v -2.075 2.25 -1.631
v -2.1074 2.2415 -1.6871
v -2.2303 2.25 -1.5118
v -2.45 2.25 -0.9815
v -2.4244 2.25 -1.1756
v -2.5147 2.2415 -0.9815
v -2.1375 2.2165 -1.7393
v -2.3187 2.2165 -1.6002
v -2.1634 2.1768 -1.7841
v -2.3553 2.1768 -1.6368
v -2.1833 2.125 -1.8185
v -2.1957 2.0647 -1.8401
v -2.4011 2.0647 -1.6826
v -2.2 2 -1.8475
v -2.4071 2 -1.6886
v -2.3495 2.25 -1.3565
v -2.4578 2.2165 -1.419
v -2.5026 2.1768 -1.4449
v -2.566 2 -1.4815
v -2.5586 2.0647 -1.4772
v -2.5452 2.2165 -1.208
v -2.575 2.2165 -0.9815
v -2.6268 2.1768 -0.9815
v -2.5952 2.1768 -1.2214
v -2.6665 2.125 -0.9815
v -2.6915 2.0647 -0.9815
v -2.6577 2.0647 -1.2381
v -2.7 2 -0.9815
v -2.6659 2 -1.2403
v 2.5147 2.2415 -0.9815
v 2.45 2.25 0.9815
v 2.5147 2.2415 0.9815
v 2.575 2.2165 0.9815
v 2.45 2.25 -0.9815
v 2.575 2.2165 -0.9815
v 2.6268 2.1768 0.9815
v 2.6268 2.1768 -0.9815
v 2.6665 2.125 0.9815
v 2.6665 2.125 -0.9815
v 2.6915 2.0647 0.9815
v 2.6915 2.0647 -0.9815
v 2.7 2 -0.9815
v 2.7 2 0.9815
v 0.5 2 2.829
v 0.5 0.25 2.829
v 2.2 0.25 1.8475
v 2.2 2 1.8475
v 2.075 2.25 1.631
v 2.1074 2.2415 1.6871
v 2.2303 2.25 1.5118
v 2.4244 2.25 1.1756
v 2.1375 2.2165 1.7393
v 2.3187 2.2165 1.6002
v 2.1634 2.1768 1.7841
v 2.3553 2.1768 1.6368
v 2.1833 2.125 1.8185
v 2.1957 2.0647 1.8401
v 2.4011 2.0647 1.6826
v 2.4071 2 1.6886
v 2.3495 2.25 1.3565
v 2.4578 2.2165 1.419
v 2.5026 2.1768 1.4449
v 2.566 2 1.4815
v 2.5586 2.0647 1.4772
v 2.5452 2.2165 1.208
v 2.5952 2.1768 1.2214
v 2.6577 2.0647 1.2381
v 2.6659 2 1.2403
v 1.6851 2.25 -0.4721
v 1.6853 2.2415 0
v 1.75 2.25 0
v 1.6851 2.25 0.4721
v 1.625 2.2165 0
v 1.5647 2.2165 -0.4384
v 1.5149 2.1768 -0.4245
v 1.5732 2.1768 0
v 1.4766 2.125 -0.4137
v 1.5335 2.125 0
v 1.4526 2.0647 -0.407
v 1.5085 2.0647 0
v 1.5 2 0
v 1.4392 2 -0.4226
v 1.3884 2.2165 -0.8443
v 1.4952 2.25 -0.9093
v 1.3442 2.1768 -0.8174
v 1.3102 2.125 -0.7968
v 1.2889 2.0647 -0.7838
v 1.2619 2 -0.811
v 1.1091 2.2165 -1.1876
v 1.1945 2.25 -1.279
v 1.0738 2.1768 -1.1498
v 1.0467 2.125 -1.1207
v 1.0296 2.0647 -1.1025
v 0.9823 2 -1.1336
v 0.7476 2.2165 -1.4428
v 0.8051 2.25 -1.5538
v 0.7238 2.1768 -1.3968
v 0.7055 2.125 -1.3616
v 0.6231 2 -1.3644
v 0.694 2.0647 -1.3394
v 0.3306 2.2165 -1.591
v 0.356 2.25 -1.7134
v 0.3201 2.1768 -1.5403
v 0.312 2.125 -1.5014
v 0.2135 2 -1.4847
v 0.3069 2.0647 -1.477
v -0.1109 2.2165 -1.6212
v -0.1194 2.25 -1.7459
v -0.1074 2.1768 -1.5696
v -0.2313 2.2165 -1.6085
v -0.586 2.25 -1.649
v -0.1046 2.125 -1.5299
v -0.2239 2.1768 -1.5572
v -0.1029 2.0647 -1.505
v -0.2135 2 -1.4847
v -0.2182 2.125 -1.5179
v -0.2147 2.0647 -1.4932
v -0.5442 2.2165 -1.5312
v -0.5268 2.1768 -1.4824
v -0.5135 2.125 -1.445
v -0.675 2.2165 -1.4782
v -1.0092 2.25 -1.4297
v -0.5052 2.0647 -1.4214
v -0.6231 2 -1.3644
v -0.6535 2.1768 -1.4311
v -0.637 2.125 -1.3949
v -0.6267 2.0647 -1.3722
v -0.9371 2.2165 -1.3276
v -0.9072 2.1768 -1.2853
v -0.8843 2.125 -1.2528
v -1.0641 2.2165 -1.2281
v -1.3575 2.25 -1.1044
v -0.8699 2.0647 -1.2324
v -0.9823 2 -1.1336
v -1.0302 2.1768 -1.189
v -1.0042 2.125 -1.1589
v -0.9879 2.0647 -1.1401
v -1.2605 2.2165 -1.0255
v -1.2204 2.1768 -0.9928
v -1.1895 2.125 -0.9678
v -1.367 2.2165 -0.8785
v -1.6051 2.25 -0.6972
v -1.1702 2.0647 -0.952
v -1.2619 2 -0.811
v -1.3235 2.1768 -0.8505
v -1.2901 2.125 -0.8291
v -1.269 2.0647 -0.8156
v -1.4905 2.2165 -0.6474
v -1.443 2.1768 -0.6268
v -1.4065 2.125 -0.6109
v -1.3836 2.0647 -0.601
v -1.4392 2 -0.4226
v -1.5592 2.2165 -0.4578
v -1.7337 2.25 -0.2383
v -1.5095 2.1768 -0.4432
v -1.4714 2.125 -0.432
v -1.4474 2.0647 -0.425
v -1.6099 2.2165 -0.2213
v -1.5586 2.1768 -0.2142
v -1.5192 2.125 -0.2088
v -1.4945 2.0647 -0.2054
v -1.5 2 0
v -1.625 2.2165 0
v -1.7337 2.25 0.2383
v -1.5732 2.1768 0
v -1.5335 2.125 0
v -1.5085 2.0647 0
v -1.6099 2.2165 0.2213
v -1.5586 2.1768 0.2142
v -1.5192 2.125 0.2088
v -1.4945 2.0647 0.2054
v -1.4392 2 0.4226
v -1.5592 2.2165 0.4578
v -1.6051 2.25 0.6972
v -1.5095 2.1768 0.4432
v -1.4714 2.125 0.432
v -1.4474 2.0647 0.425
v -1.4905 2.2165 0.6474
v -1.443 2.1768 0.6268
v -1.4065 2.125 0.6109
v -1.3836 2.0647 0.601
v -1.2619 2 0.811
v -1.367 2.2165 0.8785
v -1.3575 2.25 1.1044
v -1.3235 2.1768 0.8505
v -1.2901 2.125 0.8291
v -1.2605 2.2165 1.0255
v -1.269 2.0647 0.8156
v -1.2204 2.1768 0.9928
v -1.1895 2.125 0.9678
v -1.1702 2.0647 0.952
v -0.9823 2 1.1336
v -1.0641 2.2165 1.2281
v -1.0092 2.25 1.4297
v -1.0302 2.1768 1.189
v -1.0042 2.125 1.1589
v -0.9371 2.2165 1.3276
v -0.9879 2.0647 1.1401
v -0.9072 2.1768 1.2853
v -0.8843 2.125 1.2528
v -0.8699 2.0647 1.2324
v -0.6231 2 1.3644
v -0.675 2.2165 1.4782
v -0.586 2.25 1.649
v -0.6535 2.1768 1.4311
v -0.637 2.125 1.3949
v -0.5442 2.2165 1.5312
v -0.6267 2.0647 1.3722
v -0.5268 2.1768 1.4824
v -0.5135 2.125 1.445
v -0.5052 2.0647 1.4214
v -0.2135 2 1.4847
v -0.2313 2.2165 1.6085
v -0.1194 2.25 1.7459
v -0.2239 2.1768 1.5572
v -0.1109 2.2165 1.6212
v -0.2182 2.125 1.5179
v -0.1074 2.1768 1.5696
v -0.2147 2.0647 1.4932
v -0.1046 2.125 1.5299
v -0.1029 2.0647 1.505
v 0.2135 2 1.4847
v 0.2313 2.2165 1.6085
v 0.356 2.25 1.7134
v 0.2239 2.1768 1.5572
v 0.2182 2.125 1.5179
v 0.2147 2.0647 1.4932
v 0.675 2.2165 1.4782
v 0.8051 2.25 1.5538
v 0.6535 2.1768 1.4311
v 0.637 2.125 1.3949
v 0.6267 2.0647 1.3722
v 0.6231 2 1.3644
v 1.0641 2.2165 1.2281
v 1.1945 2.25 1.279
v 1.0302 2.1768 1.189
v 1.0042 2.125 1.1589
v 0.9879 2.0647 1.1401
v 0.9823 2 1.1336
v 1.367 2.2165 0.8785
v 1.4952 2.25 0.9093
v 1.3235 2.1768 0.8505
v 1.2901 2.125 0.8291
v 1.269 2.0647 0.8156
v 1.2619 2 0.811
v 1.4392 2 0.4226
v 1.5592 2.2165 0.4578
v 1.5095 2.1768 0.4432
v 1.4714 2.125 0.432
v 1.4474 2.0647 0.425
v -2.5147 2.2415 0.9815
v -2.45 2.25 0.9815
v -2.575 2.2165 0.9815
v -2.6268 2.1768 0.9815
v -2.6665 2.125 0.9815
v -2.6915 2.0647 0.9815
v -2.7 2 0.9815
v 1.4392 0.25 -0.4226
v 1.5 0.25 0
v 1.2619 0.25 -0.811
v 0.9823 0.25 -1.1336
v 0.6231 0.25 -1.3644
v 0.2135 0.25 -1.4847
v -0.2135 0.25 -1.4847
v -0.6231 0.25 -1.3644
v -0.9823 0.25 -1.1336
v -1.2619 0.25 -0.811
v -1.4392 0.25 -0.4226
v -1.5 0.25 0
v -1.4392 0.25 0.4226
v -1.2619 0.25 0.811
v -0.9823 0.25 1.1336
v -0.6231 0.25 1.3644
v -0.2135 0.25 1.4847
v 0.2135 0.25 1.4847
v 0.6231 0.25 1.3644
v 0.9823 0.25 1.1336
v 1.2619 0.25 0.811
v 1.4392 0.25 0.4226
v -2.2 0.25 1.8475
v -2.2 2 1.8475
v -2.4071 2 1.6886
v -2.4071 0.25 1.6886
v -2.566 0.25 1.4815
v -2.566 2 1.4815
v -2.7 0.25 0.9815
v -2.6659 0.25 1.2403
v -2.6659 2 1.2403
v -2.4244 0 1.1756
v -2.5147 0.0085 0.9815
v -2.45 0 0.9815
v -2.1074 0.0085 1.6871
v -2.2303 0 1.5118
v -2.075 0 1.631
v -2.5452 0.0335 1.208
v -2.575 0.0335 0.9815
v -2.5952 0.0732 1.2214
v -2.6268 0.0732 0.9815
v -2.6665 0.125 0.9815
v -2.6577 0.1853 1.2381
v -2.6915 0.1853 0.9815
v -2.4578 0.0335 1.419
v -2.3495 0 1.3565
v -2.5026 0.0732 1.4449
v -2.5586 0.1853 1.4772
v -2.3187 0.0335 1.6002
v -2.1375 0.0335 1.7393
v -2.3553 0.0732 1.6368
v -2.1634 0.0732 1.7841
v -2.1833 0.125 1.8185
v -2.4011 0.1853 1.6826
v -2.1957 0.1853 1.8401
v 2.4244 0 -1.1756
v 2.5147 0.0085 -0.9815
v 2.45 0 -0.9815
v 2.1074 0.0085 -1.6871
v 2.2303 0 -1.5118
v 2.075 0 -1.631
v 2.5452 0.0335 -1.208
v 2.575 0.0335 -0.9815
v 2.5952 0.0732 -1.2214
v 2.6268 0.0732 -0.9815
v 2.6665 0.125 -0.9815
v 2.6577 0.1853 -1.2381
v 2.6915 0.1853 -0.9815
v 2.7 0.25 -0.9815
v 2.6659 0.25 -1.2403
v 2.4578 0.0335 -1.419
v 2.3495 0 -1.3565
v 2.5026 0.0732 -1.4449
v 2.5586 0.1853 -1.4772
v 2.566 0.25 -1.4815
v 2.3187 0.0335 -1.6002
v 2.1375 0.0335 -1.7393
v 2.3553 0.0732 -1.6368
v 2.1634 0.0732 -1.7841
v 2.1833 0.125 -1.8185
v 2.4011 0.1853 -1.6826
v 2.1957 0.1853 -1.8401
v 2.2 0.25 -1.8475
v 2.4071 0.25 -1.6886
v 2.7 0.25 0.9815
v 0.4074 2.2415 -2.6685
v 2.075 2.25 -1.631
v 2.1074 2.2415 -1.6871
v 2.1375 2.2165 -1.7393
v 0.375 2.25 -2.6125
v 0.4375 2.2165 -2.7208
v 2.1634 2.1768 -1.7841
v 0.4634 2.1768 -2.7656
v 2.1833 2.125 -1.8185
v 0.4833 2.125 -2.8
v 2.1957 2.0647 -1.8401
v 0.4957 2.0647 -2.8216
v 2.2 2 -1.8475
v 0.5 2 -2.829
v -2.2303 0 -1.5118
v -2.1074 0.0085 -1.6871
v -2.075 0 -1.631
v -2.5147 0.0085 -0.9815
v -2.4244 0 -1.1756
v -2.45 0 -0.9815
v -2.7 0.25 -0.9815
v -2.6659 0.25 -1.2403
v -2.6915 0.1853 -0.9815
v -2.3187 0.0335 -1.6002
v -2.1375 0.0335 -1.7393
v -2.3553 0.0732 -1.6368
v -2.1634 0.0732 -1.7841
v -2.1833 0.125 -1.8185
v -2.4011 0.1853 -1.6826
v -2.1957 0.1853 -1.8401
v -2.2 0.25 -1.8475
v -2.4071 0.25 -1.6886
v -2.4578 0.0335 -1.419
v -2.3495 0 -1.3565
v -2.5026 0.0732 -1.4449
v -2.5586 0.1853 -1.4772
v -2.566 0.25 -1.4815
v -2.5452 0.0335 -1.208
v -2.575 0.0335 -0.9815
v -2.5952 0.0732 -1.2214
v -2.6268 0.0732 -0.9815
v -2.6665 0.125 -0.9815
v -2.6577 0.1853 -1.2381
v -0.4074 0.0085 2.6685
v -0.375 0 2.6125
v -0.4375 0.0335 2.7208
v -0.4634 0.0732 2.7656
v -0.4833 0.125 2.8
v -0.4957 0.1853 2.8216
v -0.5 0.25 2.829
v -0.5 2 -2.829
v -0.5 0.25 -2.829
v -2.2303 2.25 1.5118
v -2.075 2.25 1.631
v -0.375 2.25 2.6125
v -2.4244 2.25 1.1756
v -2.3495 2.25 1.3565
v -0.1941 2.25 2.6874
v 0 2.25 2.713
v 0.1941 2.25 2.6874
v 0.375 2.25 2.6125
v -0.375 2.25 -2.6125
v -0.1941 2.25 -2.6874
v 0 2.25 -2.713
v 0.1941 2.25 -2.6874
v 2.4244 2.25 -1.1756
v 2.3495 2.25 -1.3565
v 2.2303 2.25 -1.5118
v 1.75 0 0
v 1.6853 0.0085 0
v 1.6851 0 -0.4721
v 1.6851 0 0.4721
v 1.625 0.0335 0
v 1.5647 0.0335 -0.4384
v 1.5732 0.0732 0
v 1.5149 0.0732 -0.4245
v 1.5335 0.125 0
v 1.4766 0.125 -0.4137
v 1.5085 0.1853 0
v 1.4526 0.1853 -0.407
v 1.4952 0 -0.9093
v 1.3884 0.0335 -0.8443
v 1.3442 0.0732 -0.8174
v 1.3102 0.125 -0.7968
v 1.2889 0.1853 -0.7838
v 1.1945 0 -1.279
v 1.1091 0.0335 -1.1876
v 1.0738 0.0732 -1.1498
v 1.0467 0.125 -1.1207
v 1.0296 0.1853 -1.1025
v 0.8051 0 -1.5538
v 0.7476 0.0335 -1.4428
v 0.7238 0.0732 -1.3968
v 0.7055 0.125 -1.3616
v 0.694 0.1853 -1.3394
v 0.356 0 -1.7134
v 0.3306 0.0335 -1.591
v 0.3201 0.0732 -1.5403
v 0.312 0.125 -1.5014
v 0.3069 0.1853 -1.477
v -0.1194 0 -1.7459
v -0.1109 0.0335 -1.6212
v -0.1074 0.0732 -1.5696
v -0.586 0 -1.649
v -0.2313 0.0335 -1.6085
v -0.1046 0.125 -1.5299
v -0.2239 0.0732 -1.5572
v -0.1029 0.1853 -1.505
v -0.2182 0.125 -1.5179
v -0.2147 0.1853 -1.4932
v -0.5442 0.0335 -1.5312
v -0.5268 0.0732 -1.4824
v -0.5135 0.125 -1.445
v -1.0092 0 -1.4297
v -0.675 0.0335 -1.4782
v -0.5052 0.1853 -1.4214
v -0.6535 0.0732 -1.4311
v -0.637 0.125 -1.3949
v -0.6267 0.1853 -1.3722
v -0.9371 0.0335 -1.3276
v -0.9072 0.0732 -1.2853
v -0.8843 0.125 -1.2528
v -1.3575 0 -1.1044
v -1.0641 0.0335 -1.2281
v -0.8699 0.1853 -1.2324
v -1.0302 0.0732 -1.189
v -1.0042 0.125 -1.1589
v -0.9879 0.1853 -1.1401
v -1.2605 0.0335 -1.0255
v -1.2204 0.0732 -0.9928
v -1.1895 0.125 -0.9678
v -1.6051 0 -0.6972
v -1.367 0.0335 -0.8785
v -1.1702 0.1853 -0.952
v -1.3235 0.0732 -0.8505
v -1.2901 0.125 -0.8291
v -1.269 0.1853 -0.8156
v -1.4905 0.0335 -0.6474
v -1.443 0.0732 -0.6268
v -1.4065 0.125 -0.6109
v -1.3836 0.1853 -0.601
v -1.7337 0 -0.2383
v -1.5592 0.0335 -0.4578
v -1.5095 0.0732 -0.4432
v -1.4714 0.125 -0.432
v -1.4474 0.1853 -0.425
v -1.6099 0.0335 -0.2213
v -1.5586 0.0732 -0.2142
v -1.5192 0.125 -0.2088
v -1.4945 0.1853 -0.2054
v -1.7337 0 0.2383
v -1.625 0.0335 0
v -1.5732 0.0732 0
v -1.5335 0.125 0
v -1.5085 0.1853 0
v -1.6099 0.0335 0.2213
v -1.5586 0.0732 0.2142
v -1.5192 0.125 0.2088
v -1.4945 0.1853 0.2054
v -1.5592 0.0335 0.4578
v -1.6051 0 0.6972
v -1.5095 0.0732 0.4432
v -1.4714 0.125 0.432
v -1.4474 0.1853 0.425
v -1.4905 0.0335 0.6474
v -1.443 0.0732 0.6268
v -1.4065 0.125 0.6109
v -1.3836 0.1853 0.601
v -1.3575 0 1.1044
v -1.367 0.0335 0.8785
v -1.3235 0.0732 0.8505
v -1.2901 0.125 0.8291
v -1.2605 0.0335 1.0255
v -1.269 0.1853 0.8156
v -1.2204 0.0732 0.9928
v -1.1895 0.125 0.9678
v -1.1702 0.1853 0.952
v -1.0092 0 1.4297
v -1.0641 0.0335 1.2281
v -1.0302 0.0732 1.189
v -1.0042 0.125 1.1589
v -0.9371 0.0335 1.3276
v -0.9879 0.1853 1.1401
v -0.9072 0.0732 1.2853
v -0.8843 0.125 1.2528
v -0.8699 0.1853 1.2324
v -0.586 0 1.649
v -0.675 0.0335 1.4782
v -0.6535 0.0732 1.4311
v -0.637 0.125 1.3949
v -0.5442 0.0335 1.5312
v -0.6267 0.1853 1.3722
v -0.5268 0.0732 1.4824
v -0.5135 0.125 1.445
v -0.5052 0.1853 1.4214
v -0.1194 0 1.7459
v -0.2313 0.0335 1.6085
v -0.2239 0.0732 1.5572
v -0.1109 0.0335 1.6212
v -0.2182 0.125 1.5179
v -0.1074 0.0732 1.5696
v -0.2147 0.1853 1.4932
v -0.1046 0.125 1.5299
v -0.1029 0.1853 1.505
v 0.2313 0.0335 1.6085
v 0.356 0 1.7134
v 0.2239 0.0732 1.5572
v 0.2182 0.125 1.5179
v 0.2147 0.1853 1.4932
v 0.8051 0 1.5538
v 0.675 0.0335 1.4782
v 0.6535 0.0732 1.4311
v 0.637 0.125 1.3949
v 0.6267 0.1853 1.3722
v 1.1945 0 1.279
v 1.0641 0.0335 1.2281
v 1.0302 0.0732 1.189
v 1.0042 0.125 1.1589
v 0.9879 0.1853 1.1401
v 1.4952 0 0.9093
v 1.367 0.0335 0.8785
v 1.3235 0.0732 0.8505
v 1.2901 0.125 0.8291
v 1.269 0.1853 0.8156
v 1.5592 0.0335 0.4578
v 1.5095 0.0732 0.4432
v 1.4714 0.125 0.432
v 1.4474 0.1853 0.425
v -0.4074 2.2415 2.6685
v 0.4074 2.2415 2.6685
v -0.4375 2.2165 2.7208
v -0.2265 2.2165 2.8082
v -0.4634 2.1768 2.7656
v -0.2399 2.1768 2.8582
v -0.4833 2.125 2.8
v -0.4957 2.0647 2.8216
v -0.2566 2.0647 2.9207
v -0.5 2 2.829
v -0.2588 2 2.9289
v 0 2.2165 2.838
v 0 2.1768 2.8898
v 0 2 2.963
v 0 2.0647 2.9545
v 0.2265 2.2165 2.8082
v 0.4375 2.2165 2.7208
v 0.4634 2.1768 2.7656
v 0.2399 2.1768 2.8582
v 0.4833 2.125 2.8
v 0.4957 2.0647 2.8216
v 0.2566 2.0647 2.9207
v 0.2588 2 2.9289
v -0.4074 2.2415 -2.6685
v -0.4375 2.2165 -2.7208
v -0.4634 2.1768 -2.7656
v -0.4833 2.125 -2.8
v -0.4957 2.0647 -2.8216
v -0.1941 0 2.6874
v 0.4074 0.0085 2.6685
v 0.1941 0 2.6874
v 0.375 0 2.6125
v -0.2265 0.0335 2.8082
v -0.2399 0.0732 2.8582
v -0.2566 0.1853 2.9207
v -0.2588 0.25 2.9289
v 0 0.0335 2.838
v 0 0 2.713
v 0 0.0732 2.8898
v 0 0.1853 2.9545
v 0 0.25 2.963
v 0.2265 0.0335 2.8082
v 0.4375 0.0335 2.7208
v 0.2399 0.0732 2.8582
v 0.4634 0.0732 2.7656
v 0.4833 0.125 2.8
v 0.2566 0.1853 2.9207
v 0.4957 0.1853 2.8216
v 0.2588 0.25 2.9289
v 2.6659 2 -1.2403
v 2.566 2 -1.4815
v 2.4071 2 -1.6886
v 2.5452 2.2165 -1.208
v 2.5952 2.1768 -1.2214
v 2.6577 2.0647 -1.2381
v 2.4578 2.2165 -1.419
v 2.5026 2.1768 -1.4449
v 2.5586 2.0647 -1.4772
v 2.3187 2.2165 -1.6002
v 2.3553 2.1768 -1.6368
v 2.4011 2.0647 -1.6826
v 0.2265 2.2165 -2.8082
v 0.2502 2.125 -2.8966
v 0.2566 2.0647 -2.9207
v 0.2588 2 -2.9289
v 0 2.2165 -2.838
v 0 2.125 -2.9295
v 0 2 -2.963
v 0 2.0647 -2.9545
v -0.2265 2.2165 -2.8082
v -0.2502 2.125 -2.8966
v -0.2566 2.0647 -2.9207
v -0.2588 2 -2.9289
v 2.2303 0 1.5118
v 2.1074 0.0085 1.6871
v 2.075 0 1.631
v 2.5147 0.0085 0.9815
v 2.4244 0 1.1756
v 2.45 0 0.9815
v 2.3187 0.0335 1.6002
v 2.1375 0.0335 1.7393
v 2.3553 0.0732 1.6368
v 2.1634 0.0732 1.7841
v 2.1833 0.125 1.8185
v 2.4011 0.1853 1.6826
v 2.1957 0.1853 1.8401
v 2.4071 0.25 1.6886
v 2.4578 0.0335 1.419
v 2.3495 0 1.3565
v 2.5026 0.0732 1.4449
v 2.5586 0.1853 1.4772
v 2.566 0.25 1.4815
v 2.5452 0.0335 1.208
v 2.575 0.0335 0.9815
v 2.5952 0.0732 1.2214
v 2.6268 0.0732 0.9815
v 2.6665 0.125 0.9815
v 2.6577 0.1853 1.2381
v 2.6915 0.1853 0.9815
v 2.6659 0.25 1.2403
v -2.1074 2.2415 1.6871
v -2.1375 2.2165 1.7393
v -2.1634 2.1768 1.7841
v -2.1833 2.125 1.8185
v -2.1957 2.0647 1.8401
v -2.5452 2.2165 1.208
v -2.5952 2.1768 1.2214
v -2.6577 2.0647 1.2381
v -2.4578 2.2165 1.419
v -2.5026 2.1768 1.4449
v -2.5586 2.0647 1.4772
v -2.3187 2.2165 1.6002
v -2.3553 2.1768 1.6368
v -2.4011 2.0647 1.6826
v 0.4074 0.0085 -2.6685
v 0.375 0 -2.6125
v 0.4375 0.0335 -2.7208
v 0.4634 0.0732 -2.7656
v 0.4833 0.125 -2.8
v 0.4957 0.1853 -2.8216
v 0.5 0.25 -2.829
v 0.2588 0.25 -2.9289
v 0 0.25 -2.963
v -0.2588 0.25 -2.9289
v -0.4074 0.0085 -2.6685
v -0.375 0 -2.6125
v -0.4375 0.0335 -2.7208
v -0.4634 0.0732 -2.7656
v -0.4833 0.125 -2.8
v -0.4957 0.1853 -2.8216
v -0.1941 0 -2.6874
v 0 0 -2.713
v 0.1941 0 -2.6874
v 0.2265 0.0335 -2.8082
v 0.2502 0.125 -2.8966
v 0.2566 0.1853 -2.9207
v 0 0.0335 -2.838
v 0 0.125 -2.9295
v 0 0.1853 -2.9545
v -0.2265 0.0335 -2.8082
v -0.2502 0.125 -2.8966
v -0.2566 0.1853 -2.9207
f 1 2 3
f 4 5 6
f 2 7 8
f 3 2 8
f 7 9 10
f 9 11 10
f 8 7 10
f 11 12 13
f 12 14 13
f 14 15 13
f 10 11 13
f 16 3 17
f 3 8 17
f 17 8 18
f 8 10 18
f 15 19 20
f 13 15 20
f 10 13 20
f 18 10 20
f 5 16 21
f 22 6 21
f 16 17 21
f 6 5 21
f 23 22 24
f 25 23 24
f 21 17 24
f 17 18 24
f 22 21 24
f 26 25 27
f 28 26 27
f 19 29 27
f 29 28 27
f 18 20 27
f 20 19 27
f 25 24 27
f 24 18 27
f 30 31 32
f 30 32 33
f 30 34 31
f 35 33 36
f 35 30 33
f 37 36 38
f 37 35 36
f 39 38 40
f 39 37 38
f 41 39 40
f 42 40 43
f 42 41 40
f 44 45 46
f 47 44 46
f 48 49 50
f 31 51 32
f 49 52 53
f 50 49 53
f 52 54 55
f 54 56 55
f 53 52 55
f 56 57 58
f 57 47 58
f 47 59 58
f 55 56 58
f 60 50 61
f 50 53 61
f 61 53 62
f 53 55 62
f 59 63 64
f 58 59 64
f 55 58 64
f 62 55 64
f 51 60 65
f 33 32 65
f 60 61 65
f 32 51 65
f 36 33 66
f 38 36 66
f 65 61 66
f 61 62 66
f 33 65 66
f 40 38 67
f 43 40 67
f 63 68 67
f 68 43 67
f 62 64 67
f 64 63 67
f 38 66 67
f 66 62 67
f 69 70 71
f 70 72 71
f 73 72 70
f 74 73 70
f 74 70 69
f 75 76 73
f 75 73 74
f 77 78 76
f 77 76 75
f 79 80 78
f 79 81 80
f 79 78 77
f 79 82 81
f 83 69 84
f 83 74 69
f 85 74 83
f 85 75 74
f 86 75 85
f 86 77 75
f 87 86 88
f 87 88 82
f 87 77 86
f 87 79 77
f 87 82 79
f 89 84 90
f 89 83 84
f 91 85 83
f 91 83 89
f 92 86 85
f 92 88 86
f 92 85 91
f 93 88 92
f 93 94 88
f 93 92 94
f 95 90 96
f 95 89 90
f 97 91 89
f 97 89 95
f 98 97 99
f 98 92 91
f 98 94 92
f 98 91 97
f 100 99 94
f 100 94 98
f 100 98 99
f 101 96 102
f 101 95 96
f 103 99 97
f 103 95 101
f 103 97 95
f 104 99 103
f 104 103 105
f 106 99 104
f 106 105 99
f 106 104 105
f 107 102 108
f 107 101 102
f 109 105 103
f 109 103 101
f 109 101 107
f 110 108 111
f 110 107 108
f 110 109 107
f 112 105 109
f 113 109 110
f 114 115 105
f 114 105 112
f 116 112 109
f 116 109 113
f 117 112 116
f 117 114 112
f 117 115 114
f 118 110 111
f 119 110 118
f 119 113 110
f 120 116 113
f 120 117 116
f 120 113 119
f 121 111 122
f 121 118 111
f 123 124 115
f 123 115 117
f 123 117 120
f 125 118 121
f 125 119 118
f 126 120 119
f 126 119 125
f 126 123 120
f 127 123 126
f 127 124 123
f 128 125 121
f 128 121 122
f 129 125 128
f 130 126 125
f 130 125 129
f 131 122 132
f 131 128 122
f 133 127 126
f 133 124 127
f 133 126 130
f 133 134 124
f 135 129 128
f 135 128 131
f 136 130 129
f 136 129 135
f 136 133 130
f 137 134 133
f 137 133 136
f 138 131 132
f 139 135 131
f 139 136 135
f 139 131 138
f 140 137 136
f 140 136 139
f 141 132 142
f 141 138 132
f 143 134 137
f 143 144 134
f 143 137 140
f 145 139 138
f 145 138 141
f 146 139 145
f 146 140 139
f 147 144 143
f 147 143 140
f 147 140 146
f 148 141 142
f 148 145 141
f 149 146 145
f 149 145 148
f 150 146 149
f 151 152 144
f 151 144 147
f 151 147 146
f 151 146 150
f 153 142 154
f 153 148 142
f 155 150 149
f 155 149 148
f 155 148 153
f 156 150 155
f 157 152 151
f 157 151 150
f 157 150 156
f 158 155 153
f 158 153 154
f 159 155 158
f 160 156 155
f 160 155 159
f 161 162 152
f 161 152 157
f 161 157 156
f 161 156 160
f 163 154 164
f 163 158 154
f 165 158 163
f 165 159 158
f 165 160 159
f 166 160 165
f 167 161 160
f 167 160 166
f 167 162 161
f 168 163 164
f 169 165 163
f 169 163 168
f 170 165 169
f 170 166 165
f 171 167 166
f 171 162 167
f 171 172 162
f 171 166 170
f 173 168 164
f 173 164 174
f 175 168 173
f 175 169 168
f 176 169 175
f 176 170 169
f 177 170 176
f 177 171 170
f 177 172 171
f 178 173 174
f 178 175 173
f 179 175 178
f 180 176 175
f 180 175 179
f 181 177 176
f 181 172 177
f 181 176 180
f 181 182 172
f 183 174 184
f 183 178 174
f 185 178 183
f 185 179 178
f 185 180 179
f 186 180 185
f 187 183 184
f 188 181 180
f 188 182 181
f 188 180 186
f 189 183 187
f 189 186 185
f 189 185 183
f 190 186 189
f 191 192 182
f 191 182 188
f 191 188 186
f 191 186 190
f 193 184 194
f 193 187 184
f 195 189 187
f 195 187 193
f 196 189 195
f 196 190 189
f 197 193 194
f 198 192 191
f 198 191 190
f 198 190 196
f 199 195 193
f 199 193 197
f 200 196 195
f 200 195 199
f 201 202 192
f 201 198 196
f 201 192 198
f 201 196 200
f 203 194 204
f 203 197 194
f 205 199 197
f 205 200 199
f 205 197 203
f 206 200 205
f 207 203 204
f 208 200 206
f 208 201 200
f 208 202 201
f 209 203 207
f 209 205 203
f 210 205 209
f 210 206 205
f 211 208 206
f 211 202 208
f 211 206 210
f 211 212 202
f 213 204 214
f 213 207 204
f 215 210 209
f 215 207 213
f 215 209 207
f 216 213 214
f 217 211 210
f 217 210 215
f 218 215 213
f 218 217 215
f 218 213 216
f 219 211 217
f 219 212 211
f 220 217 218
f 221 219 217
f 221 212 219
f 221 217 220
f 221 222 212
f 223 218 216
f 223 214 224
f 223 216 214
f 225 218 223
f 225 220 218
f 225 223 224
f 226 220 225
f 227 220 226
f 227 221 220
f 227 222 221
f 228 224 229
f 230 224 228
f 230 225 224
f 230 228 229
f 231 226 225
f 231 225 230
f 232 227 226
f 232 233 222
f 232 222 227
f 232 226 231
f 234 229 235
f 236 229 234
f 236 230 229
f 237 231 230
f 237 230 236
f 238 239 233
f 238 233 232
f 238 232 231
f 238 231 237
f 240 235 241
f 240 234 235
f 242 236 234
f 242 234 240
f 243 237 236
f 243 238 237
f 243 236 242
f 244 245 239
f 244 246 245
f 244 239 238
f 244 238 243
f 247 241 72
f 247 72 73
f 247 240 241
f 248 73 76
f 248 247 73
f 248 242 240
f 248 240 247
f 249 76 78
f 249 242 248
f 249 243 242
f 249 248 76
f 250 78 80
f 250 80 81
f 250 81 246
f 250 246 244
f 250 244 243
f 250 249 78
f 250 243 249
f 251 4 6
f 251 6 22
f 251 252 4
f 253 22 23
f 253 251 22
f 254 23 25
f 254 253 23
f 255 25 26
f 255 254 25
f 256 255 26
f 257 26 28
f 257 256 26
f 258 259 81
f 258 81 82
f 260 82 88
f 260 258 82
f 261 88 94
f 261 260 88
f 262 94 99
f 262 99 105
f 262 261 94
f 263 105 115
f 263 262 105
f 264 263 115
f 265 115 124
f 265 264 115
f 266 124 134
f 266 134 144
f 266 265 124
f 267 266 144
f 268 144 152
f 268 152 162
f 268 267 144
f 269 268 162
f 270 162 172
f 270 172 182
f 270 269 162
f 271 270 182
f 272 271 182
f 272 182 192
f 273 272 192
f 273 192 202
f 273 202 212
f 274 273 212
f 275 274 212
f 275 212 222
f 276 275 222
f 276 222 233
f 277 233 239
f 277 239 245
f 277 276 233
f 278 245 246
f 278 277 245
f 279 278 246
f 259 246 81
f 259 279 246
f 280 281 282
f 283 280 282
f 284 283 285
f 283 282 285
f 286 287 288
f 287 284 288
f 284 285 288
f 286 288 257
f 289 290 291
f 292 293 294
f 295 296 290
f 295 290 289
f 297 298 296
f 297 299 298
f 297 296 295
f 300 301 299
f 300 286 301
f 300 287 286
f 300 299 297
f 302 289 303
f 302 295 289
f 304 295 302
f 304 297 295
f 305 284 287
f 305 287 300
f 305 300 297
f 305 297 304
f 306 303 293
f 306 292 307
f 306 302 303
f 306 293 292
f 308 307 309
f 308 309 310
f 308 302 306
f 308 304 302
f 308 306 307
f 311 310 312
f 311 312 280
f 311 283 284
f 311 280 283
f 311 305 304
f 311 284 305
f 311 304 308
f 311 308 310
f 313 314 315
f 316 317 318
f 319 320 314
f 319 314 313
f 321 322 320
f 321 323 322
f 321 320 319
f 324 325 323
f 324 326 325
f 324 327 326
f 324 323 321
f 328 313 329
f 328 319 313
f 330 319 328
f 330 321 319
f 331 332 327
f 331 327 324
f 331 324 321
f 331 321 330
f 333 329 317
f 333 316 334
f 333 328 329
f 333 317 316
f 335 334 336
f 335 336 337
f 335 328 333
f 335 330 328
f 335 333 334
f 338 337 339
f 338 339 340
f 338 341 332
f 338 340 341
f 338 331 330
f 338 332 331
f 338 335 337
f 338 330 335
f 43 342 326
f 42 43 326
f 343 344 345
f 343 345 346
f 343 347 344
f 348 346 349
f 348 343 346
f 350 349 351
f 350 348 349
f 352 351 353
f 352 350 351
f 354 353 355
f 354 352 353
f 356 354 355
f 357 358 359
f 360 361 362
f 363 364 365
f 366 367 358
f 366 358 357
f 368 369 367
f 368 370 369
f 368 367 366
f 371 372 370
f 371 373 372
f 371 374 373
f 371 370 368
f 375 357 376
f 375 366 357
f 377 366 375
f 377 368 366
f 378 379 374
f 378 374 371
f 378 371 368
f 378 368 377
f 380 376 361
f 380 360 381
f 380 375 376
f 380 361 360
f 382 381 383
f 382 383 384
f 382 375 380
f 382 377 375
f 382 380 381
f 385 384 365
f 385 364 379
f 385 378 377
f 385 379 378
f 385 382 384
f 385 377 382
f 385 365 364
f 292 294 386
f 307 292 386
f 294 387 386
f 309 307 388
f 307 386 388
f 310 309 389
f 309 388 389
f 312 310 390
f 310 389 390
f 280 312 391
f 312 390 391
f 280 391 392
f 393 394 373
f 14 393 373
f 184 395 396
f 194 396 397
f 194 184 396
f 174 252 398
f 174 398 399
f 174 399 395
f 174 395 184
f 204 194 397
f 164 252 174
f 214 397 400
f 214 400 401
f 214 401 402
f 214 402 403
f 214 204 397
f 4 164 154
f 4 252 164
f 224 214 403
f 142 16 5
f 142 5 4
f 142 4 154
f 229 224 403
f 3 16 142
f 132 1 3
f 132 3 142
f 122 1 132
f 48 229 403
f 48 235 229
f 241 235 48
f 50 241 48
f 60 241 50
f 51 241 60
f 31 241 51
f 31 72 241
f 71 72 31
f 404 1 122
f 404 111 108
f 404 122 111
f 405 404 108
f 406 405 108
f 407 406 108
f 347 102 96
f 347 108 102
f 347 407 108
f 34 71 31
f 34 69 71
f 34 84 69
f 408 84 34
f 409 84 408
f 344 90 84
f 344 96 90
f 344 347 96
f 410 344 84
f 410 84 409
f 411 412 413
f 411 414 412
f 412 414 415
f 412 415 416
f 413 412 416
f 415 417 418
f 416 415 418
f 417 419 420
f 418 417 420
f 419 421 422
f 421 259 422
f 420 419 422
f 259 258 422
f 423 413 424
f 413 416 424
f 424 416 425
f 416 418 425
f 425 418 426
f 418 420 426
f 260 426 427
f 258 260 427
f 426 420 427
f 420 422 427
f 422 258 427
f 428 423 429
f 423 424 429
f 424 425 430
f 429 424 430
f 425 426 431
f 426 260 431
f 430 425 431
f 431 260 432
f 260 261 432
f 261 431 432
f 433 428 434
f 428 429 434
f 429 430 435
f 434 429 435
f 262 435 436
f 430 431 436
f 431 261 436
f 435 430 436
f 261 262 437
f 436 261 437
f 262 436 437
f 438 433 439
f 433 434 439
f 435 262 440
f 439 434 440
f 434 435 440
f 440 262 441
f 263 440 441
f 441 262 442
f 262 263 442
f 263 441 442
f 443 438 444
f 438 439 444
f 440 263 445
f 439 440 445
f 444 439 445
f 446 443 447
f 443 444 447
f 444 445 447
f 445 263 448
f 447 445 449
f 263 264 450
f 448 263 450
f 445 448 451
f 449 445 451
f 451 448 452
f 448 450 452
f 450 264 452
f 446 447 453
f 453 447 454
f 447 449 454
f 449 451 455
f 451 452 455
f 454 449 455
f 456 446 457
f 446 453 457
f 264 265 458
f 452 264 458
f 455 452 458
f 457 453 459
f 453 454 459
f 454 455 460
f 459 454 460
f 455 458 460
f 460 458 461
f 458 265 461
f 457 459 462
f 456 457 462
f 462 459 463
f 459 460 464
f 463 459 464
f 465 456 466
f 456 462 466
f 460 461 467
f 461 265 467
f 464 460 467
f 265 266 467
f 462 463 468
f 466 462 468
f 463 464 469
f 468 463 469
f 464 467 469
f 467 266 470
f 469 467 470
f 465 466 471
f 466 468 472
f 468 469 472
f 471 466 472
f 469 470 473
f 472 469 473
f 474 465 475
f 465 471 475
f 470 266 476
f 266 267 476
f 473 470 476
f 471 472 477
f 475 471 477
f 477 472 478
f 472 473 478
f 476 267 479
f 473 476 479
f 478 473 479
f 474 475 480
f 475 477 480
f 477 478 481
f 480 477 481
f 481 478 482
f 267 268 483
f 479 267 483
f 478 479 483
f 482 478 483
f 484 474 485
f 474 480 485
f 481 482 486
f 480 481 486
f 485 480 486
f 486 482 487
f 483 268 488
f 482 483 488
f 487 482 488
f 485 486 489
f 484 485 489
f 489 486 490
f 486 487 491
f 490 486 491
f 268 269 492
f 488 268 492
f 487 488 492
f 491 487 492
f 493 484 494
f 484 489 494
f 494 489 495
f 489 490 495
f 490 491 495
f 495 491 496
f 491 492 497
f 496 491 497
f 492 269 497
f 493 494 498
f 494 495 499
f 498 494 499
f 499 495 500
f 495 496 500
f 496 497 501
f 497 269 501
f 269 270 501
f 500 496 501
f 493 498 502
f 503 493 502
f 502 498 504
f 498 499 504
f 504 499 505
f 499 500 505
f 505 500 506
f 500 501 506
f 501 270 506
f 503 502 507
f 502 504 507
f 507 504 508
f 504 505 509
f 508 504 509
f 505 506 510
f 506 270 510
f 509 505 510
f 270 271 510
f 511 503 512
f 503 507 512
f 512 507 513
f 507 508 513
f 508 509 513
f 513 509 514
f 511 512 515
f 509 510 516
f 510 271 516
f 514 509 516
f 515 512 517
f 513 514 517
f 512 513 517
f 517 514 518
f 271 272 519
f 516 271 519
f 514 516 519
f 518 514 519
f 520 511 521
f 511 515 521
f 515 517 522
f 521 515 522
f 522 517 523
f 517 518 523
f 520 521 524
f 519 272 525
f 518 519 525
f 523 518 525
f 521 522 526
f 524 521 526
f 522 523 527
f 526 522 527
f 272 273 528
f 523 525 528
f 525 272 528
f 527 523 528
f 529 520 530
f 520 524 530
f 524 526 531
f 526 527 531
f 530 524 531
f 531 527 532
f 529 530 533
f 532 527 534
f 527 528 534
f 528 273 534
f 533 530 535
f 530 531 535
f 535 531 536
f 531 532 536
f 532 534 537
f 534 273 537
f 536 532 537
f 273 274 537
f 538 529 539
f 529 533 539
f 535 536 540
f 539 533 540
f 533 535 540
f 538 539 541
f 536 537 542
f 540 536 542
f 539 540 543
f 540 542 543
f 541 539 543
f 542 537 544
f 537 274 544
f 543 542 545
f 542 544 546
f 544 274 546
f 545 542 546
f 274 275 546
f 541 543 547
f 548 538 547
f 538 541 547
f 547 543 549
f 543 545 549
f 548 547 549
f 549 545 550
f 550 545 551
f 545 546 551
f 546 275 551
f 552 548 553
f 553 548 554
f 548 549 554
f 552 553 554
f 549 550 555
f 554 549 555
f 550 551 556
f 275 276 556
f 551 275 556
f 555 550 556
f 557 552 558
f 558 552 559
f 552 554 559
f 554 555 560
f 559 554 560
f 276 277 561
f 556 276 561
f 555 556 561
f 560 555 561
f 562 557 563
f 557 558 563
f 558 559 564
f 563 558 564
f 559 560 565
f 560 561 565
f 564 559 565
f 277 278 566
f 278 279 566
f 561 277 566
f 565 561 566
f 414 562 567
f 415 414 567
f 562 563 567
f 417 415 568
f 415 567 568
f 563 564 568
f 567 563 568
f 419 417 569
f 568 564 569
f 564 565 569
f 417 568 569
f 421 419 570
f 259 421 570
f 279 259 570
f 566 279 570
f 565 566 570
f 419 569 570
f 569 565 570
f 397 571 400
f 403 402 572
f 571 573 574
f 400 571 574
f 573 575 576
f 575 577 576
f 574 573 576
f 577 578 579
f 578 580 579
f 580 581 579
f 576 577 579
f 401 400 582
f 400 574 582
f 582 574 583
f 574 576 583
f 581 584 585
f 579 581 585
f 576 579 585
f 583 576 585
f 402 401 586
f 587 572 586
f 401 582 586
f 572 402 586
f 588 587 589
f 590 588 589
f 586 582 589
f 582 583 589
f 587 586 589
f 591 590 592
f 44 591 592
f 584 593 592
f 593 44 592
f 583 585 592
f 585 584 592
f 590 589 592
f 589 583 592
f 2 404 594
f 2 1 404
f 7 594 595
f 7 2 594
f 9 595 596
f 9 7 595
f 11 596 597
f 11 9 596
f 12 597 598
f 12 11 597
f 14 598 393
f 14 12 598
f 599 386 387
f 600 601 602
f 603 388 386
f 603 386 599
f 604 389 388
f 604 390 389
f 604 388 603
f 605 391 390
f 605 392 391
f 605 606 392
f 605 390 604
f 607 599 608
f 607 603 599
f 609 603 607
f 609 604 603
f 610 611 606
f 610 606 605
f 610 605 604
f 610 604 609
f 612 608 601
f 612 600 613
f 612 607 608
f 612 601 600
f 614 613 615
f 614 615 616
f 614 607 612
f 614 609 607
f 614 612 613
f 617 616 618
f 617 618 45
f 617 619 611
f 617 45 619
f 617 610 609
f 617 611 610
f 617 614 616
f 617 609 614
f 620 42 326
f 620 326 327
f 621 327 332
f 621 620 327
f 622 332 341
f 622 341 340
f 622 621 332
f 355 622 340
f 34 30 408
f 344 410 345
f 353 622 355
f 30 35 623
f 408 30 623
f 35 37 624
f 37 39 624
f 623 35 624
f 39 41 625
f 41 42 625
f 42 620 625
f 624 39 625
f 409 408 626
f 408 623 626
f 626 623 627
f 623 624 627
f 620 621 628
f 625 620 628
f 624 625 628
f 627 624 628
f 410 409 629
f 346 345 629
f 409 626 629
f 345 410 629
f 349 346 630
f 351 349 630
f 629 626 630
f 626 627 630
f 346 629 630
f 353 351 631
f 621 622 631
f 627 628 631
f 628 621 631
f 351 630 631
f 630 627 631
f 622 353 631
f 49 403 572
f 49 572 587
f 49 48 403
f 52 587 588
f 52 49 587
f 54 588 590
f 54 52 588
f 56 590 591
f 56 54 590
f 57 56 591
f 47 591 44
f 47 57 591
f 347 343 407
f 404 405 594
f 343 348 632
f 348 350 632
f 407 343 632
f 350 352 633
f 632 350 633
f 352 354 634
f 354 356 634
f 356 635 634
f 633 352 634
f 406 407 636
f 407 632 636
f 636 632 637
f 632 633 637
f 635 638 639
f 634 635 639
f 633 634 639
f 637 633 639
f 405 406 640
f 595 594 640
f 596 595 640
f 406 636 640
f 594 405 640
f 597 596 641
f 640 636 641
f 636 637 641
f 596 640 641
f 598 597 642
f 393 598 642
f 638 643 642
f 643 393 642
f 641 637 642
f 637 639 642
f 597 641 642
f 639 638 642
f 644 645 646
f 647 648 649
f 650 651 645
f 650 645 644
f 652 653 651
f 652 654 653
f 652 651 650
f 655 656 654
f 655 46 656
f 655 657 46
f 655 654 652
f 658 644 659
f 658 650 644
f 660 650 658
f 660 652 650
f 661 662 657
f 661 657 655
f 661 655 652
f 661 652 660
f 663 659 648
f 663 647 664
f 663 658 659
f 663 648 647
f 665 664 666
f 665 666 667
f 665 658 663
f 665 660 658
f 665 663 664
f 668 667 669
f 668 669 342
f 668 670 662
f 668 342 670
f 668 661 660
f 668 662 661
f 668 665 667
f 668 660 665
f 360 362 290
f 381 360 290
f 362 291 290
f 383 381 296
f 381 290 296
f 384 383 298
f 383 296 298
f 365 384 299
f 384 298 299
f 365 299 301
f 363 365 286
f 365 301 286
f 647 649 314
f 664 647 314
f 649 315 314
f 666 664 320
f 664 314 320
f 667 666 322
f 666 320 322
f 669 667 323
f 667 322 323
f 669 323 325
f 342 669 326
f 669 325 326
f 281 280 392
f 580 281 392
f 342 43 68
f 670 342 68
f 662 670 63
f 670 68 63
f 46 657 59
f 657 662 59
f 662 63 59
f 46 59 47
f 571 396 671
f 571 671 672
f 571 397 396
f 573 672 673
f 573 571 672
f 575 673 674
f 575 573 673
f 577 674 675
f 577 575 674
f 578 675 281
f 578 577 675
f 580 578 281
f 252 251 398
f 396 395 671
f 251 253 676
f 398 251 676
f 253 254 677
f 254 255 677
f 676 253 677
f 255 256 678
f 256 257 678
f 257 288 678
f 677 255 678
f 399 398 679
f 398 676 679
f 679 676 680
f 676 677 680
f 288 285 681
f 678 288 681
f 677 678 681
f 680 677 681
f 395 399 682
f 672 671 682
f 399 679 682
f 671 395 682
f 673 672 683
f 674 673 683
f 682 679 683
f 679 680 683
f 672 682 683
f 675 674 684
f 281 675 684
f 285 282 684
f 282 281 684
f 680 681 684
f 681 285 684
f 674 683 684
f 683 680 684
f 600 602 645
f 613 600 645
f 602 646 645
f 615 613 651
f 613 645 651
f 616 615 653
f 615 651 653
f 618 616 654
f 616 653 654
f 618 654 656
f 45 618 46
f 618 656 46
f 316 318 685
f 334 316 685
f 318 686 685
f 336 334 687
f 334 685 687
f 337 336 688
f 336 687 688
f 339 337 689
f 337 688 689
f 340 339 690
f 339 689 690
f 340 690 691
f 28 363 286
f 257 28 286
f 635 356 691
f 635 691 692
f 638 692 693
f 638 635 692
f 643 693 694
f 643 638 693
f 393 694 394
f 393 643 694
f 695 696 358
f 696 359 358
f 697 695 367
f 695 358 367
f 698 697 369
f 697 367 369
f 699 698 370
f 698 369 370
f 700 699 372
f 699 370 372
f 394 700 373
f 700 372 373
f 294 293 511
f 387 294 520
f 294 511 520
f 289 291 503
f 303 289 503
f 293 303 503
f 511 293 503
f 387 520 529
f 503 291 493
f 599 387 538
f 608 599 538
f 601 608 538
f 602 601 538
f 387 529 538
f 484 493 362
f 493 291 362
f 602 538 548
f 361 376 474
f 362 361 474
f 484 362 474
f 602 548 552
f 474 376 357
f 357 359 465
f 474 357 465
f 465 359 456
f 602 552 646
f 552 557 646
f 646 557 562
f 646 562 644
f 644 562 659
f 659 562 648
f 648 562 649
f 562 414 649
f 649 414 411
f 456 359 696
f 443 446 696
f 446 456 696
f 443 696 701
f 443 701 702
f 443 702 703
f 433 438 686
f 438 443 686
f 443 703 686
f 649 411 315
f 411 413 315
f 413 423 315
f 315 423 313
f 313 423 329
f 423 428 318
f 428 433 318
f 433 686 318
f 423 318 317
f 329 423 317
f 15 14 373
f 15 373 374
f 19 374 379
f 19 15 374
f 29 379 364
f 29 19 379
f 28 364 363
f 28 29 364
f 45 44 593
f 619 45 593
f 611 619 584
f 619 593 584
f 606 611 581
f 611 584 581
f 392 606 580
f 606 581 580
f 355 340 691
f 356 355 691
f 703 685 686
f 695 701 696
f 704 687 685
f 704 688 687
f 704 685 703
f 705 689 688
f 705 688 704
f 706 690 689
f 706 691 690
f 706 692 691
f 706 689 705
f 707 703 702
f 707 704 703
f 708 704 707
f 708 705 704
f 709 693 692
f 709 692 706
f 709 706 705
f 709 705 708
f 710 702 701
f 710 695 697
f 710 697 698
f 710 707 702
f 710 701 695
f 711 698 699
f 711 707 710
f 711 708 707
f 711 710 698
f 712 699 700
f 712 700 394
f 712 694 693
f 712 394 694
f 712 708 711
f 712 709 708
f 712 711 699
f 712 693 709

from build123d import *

# Parameters (mm, degrees)
SKETCH1_R           = 1.5
BOSS_EXTRUDE1_DEPTH = 2.25
FILLET1_R           = 1
FILLET2_R           = 0.25


with BuildPart() as part:
    # Sketch1 → Boss-Extrude1 (new body)
    with BuildSketch(Plane(origin=(0, 0, 0), x_dir=(1, 0, 0), z_dir=(0, 1, 0))):
        Polygon((2.7, -1.558845727), (2.7, 1.558845727), (0, 3.117691454), (-2.7, 1.558845727), (-2.7, -1.558845727), (0, -3.117691454), align=None)
        Circle(SKETCH1_R, mode=Mode.SUBTRACT)
    extrude(amount=BOSS_EXTRUDE1_DEPTH)

    # Fillet1
    fillet1_edges = [part.edges().sort_by_distance(p)[0] for p in [
        (0, 1.125, 3.117691454),
        (-2.7, 1.125, 1.558845727),
        (-2.7, 1.125, -1.558845727),
        (0, 1.125, -3.117691454),
        (2.7, 1.125, -1.558845727),
        (2.7, 1.125, 1.558845727),
    ]]
    fillet(fillet1_edges, radius=FILLET1_R)

    # Fillet2
    fillet2_edges = [part.edges().sort_by_distance(p)[0] for p in [
        (-1.5, 0, 0),
        (-1.5, 2.25, 0),
        (-1.35, 0, -2.33826859),
        (-1.35, 2.25, -2.33826859),
        (1.35, 0, 2.33826859),
        (-1.35, 0, 2.33826859),
        (-2.7, 0, 0),
        (1.35, 0, -2.33826859),
        (2.7, 0, 0),
        (0, 0, 2.962990915),
        (2.566025404, 0, 1.481495458),
        (2.566025404, 0, -1.481495458),
        (-2.566025404, 0, 1.481495458),
        (-2.566025404, 0, -1.481495458),
        (0, 0, -2.962990915),
        (1.35, 2.25, -2.33826859),
        (1.35, 2.25, 2.33826859),
        (2.7, 2.25, 0),
        (-2.7, 2.25, 0),
        (-1.35, 2.25, 2.33826859),
        (0, 2.25, 2.962990915),
        (2.566025404, 2.25, 1.481495458),
        (2.566025404, 2.25, -1.481495458),
        (-2.566025404, 2.25, 1.481495458),
        (-2.566025404, 2.25, -1.481495458),
        (0, 2.25, -2.962990915),
    ]]
    fillet(fillet2_edges, radius=FILLET2_R)


solid = part.part
